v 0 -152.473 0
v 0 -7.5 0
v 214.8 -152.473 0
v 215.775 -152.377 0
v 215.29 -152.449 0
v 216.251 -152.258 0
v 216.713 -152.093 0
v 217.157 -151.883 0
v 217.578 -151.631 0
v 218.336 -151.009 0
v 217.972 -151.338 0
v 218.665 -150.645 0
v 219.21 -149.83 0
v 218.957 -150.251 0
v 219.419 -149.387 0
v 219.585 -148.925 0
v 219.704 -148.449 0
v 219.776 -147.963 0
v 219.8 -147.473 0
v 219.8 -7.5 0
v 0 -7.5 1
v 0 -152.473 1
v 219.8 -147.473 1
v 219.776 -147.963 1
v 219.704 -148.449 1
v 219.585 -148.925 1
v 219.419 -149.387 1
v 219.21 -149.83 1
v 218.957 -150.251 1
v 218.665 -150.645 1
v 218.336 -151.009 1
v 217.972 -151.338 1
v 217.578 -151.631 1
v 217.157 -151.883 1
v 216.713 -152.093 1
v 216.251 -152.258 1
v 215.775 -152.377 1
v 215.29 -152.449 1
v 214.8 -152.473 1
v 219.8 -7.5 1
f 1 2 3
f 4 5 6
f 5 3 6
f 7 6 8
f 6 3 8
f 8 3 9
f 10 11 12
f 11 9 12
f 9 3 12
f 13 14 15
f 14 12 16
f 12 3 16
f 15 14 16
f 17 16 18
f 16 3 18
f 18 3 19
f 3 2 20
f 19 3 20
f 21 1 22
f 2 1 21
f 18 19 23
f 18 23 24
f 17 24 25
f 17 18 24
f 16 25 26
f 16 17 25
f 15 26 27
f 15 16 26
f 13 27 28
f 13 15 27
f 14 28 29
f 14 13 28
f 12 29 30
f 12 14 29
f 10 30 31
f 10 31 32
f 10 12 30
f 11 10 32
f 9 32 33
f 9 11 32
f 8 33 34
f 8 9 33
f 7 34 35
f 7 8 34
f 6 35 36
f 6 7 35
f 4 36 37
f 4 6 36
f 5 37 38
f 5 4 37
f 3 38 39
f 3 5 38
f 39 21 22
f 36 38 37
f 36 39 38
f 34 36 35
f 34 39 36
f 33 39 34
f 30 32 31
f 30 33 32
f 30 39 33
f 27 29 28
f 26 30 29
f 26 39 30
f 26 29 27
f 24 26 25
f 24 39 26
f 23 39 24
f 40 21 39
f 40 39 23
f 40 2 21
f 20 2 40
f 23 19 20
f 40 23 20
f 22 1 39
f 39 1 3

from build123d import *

# Parameters (mm, degrees)
SKETCH1_W           = 219.8
SKETCH1_H           = 144.9732
BASE_FLANGE1_DEPTH  = 1
BREAK_CORNER1_DEPTH = 1


# Read off the part's stored shape, not the designer's step: Break-Corner1
# Sheet-metal steps are written as plain solids
with BuildPart() as part:
    # Sketch1 → Base-Flange1 (new body)
    with BuildSketch(Plane.XY):
        with Locations((109.9, -79.9866)):
            Rectangle(SKETCH1_W, SKETCH1_H)
    extrude(amount=BASE_FLANGE1_DEPTH)

    # Break-Corner1 outline → Break-Corner1 (cut)
    with BuildSketch(Plane.XY):
        with BuildLine():
            Line((219.8, -152.4732), (219.8, -147.4732))
            ThreePointArc((219.8, -147.4732), (218.335533906, -151.008733906), (214.8, -152.4732))
            Line((214.8, -152.4732), (219.8, -152.4732))
        make_face()
    extrude(amount=BREAK_CORNER1_DEPTH, mode=Mode.SUBTRACT)


solid = part.part
